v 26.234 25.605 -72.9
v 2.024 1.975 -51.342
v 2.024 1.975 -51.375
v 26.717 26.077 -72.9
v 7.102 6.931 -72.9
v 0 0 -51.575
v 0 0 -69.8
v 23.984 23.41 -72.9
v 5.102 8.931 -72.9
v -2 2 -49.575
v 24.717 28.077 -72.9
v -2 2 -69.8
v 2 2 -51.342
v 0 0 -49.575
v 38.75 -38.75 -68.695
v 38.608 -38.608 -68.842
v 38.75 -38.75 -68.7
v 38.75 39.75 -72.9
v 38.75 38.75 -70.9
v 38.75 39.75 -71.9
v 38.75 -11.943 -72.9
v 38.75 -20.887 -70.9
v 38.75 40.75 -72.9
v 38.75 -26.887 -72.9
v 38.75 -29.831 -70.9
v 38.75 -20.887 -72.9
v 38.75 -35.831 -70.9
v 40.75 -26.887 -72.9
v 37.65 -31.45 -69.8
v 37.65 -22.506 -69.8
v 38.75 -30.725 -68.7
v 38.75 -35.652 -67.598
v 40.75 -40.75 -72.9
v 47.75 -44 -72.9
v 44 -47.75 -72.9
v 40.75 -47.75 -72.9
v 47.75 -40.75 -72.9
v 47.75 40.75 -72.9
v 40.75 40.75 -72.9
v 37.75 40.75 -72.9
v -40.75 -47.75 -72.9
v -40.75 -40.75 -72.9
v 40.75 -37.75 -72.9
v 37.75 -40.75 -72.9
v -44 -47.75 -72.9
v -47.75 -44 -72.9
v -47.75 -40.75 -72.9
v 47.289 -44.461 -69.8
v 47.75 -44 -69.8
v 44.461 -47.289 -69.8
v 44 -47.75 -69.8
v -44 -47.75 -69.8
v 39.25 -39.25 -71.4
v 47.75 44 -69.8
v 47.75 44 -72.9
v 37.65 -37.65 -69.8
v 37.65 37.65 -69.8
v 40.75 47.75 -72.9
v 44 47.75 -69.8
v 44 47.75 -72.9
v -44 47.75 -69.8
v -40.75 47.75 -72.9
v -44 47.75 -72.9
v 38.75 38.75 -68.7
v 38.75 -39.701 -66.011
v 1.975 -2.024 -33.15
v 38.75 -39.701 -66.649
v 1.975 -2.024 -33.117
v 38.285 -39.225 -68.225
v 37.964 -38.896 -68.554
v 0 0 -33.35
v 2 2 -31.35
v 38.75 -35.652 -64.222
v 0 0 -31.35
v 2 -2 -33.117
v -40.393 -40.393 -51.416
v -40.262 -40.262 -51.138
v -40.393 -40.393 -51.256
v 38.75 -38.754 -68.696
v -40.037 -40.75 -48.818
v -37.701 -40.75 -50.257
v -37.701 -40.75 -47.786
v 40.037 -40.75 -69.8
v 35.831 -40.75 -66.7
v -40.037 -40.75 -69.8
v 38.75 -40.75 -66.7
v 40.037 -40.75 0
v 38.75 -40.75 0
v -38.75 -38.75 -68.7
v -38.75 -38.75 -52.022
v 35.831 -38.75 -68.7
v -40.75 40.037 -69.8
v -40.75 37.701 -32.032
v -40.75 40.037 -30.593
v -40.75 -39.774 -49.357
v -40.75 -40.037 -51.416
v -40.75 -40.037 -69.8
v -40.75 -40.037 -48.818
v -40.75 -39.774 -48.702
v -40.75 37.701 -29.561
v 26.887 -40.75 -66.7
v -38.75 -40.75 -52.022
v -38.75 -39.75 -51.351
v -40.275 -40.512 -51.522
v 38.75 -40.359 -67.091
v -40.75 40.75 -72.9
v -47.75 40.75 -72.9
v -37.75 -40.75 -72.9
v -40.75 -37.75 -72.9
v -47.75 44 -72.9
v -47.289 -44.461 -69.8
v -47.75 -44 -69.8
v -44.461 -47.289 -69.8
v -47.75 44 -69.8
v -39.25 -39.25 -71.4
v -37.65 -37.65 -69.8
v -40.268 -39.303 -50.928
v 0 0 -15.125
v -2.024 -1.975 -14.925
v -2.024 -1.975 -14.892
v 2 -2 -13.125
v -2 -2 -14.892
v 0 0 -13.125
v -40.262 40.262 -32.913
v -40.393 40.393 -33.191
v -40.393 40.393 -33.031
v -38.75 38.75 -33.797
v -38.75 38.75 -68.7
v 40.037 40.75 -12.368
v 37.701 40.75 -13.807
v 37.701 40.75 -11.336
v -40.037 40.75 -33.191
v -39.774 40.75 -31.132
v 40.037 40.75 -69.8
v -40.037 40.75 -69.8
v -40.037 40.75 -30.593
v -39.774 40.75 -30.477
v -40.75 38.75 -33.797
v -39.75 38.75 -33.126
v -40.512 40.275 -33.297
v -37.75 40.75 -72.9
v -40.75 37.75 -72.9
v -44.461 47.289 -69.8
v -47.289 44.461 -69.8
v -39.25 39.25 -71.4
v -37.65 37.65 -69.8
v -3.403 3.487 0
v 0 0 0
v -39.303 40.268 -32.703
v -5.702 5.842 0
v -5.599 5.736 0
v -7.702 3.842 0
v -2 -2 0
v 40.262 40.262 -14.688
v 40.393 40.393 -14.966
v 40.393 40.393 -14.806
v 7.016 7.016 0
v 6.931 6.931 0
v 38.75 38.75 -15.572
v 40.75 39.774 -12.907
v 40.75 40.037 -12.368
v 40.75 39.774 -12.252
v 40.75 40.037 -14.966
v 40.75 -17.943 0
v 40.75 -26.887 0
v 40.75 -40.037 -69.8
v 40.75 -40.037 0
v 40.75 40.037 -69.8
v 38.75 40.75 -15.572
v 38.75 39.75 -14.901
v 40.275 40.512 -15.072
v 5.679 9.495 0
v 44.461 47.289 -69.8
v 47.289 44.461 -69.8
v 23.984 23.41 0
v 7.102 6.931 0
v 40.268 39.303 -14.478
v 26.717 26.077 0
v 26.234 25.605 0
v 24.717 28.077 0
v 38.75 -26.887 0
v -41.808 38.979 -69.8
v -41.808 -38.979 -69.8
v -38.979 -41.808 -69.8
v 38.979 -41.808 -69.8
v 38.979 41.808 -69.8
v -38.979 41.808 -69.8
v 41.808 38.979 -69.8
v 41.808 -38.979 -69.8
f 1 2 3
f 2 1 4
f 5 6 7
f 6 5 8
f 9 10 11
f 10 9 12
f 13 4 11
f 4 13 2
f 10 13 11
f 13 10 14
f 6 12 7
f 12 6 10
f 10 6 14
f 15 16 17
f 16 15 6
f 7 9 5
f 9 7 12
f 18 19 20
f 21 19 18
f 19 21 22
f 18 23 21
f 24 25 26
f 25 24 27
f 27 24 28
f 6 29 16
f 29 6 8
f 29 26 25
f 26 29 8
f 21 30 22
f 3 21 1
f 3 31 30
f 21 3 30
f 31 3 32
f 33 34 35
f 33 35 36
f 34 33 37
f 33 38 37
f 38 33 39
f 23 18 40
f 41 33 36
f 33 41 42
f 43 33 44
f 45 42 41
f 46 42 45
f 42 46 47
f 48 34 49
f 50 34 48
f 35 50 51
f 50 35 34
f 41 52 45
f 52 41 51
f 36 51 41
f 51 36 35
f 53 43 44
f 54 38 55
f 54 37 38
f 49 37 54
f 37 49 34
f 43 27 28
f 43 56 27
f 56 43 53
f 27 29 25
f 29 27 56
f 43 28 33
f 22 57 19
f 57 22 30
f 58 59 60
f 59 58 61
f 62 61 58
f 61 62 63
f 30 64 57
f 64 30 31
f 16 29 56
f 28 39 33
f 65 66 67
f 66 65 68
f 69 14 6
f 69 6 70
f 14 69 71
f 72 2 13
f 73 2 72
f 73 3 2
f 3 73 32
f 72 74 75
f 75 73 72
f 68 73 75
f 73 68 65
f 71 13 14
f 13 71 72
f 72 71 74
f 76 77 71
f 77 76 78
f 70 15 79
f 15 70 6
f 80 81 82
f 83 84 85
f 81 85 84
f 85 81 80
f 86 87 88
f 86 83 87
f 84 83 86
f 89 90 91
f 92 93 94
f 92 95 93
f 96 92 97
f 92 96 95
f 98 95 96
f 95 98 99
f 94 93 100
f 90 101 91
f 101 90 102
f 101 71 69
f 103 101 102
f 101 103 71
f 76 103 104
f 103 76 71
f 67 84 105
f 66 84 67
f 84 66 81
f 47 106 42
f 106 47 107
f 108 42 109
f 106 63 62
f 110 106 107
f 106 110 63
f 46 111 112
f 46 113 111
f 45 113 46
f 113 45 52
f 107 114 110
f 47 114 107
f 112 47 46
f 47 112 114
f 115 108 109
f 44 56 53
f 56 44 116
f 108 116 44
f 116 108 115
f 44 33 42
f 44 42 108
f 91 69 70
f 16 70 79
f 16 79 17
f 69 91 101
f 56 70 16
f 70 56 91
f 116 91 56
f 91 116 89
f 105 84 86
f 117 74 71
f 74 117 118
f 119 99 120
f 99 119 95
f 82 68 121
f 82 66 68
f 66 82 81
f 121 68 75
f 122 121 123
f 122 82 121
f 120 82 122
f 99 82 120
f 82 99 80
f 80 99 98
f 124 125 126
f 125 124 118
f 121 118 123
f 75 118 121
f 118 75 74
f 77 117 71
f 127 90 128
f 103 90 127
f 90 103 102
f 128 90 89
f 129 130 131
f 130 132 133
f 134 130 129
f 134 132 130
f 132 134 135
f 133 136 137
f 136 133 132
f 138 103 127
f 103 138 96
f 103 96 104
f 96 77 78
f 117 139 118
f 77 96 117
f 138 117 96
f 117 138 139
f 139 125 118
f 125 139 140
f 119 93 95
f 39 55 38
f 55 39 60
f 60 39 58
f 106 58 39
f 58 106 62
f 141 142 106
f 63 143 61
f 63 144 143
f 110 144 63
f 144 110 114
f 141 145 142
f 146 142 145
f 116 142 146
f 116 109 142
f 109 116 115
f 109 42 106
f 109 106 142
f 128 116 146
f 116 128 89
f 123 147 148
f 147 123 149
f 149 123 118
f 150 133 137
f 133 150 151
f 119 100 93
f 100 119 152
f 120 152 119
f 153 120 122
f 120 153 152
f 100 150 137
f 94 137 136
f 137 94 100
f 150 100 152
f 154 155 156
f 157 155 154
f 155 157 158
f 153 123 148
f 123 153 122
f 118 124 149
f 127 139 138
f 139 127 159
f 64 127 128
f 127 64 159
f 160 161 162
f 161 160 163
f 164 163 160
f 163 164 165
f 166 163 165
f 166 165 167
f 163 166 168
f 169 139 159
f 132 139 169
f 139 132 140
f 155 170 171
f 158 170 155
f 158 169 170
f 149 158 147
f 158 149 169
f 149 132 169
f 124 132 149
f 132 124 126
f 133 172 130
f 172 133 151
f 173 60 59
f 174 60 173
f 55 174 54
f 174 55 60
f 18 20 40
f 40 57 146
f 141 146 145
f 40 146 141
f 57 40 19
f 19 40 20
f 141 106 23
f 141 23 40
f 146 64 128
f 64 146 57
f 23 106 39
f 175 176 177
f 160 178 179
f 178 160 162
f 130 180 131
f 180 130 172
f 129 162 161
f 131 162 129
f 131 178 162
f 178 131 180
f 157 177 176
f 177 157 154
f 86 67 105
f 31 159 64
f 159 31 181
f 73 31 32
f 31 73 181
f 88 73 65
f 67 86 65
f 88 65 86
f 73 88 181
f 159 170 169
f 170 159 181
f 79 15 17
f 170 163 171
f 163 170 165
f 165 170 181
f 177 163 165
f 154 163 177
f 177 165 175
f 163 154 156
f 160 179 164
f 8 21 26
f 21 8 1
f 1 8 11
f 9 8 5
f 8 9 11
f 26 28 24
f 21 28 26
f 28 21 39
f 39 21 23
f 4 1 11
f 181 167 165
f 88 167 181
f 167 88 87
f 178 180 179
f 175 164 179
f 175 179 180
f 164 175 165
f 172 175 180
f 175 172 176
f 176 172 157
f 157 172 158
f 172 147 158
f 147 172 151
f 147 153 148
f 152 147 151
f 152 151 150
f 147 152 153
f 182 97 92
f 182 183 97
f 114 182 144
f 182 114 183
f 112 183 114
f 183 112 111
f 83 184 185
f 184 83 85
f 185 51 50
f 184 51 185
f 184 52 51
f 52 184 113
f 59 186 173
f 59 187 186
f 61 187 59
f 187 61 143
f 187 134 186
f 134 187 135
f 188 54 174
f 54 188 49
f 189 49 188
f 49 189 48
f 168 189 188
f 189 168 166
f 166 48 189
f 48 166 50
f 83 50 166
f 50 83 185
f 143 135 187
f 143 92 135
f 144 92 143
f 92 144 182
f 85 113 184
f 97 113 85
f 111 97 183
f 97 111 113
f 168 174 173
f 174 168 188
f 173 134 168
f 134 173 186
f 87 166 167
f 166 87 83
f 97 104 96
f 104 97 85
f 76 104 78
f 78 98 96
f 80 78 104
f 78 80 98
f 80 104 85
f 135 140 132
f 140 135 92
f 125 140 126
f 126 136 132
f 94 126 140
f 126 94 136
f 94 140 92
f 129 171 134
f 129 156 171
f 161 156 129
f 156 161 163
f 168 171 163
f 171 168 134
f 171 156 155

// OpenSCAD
wall_height = 76;               // height of support post
post_2x_on_center = 102;       // horizontal distance from center to center of posts along 2X walls
corner_support_depth = 3.1;  // from top of roof support ledge to top of post

max_wall_width = 6.5;
inside_max_width = post_2x_on_center - max_wall_width;

function dt_t1( i, j ) = [ i, j, i+3];
function dt_t2( i, j ) = [  i+3, j, j+3 ];
module depth_tri( a, b, c, delta ) {
    //echo( "beveled_cube ", b1, b2, t1, t2 );
    points = [
                  [ a.x, a.y,  a.z ],  //0
                  [ b.x, b.y,  b.z ],  //1
                  [ c.x,  c.y,  c.z ],  //2
                  [ a.x + delta.x, a.y+ delta.y,  a.z + delta.z],  //3
                  [ b.x+ delta.x, b.y+ delta.y,  b.z + delta.z],  //4
                  [ c.x+ delta.x, c.y+ delta.y,  c.z + delta.z],  //5
            ];
     polyhedron(  points = points,
             faces = [
                  [0,1,2],  // top
                /*
                     dt_t1(0,1), dt_t2(0,1),
                     dt_t1(1,2), dt_t2(1,2),
                     dt_t1(2,0), dt_t2(2,0),
    */
                  [2,1,4,5],  // side BC
                  [2,5,3,0],  // side CA
                  [3,5,4],  // bottom
                  [0,3,4,1],  // side AB
    
                   //[0,1,4,], [ 4,3,1 ],  // side AB

                  // [5, 4, 3],  // bottom
              
                  
            ] , convexity = 3 );
}

module depth_quad( a, b, c, d, delta ) {
    center = [
                    (a.x+b.x+c.x+d.x) / 4,
                    (a.y+b.y+c.y+d.y) / 4,
                    (a.z+b.z+c.z+d.z) / 4,
            ];
    
    union() {
        for ( edge = [
                        [a, b ],
                        [b,c],
                        [c,d],
                        [d,a],
                    ] ) 
        {
             e1 = edge[0];
            e2 = edge[1];
            depth_tri( e1, e2, center, delta );
        }
    }
}


module depth_rect( a, b, delta ) {
    depth_tri( 
                        [ a.x, a.y. a.z ],
                        [ b.x, a.y. a.z ],
                        [ b.x, b.y. b.z ],
                        delta 
                );
}

module TopFrameQuarter(dstep)  {
    himw = inside_max_width / 2;
    frame_width = 7;
    frame_corner_offset = 3;
    c_wall_width = 2;
    
    qheight = (wall_height - corner_support_depth) / 4 ;
    rim_outer = himw;
    rim_outer_corner = post_2x_on_center /2 - 7;
    rim_inner = himw - frame_width;
    rim_inner_corner = himw - (frame_width+frame_corner_offset); 

// difference() 
    { union() {
        if(1) { // top bevel
            tb_outer_edge = rim_outer;
            tb_inner_edge = rim_inner;
            if(0) depth_quad( 
                        [0,tb_outer_edge, 0],
                        [tb_outer_edge,tb_outer_edge, 0],
                        [tb_inner_edge , tb_inner_edge, -corner_support_depth ],
                        [tb_inner_edge,0 , -corner_support_depth],
                        [0, 0, corner_support_depth *10] );
            
                cube_side = sqrt( corner_support_depth*corner_support_depth*2 );
               translate( [tb_inner_edge-corner_support_depth, tb_outer_edge , -corner_support_depth ] ) {
                   rotate( [90,45,0] )
                   cube( [ cube_side,cube_side, tb_outer_edge*2 ] );
               }
        }
        translate( [0, 0,-corner_support_depth] ) {
            linear_extrude( height = corner_support_depth ) {
                
                polygon( [
                            [rim_outer, rim_outer_corner ],
                            [rim_outer, 0],
                            [rim_inner, 0],
                            [rim_inner, rim_inner_corner],
                            [rim_inner_corner, rim_inner],
                            [0,rim_inner],
                            [0,rim_outer],
                            [rim_outer_corner,rim_outer ],
                    ] );
            }
            
            
            d = -qheight * dstep;

            c_wall_offset = [0,0,-c_wall_width];
            cww2 = c_wall_width/2;
            if( dstep == -1 ) {
                if(0) depth_tri( 
                        [ rim_inner, rim_inner, d ],
                                    [ 0, rim_inner, d],
                                    [ 0, 0, d-qheight],
                                    c_wall_offset
                            );
                depth_tri( 
                                    [ rim_inner, rim_inner, d ],
                                    [ rim_inner, 0, d],
                                    [ 0, 0, d-qheight],
                                    c_wall_offset
                            );                
        //} else if(1) {
        }else if(0) { // complex
            
                   depth_tri( 
                        [ rim_inner, rim_inner, d ],
                                    [ 0, rim_inner, d],
                                    [ 0, 0, d-qheight],
                                    c_wall_offset
                            );
                    depth_tri( 
                                    [ rim_inner, rim_inner, d ],
                                    [ rim_inner, 0, d],
                                    [ 0, 0, d-qheight],
                                    c_wall_offset
                            );   
                    depth_quad ( 
                                [  rim_inner, rim_inner, d ],
                                [  rim_inner, 0, d+qheight ],
                                 [  0, 0,  d],
                                 [  0, 0,  d-qheight ],
                                [ -c_wall_width, -c_wall_width, -c_wall_width ]
                            );
                depth_quad ( 
                                [  rim_inner, rim_inner_corner, 0 ],
                                [  rim_inner, 0, 0 ],
                                [  rim_inner, 0,  d +qheight -c_wall_width],
                                [  rim_inner, rim_inner_corner, d -c_wall_width],
                                [ -c_wall_width, 0, 0 ]
                            );                
                depth_quad ( 
                                [  rim_inner_corner, rim_inner, 0 ],
                                [  0, rim_inner, 0 ],
                                [  0, rim_inner, d ],
                                [  rim_inner_corner, rim_inner, d ],
                                [ 0, -c_wall_width, 0 ]
                            );
            } else {
                if(1) { // slope
                    depth_tri( 
                            [ rim_inner, rim_inner, d ],
                                        [ rim_inner, -rim_inner, d+qheight],
                                        [ 0, 0, d-qheight],
                                        c_wall_offset
                                );                
                }
                if(1) { // inner / vertical center join
                    
                    depth_quad( 
                            [ rim_inner+cww2, -rim_inner, d+qheight],
                            [ rim_inner+cww2, -rim_inner, d+qheight-c_wall_width],
                            [ 0, 0, d-qheight-c_wall_width],
                            [ 0,0, d],
                                        [ -c_wall_width, -c_wall_width, 0]
                                );        
                }
               if(1) { // outer side wall
                   depth_quad (  
                            //[ rim_inner, rim_inner, d+qheight ],
                            //[ rim_inner, -rim_inner, d+qheight],
                            [ rim_inner, rim_inner,  d ],
                            [ rim_inner, rim_inner,  0 ],
                            [ rim_inner, -rim_inner,  0 ],
                            [ rim_inner, -rim_inner, d+qheight],
                                    [ -c_wall_width, 0, 0 ]
                                );            
               }           

            }
        }
    }
    

    }
}

module post_tongue_cuts() {
    {    
            for( angle = [ 0, 90, 180, 270 ] ) {
                rotate( [0,0,angle] )
                translate( [post_2x_on_center/2, post_2x_on_center/2,-wall_height-corner_support_depth ] ) {
                    ledge_cutout_width = 4;
                    ledge_cutout_length = 15;
                        rotate( [0,0,135] )
                            translate( [-ledge_cutout_width/2,0,0] )
                            cube( [ledge_cutout_width, ledge_cutout_length, wall_height ] );
                    }
            }
        }
}

module TopFrameQuarters()   {
    union() {
        for( quarter_specs = [ 
                        [0, 0],
                        [90, 1],
                        [180, 2],
                        [270, 3],
                        [0, 4],
                    ] ) {
            angle = quarter_specs[0];
            dstep = quarter_specs[1];
            rotate( [0,0,angle] ) TopFrameQuarter(dstep);
        }
    }
}

module max_box() {
                lower_max_width =  inside_max_width -14;
            union() {
                translate( [ -lower_max_width/2, -lower_max_width/2, -(wall_height-corner_support_depth)] )
                cube( [ lower_max_width, lower_max_width, wall_height-corner_support_depth  ] );
               translate( [ -post_2x_on_center/2, -post_2x_on_center/2, -corner_support_depth] )
                    cube( [ post_2x_on_center, post_2x_on_center, corner_support_depth  ] );
                }
}

module TopFrame()  {
    translate( [0,0,wall_height-corner_support_depth] )
    difference() 
    {
        intersection()
        {
            TopFrameQuarters();
            max_box();
        }
        post_tongue_cuts();               
    }
}

module TopFrameBorder()   {
    translate( [0,0,wall_height] )  difference() {
        cube( [ post_2x_on_center, post_2x_on_center, 2], center = true );
        cube( [ inside_max_width, inside_max_width, 3], center = true );
    }
}

if( 0 ) {
    TopFrameQuarters();
} else {
     // for stl 
    rotate( [180,0,0] ) TopFrame() ;
}
